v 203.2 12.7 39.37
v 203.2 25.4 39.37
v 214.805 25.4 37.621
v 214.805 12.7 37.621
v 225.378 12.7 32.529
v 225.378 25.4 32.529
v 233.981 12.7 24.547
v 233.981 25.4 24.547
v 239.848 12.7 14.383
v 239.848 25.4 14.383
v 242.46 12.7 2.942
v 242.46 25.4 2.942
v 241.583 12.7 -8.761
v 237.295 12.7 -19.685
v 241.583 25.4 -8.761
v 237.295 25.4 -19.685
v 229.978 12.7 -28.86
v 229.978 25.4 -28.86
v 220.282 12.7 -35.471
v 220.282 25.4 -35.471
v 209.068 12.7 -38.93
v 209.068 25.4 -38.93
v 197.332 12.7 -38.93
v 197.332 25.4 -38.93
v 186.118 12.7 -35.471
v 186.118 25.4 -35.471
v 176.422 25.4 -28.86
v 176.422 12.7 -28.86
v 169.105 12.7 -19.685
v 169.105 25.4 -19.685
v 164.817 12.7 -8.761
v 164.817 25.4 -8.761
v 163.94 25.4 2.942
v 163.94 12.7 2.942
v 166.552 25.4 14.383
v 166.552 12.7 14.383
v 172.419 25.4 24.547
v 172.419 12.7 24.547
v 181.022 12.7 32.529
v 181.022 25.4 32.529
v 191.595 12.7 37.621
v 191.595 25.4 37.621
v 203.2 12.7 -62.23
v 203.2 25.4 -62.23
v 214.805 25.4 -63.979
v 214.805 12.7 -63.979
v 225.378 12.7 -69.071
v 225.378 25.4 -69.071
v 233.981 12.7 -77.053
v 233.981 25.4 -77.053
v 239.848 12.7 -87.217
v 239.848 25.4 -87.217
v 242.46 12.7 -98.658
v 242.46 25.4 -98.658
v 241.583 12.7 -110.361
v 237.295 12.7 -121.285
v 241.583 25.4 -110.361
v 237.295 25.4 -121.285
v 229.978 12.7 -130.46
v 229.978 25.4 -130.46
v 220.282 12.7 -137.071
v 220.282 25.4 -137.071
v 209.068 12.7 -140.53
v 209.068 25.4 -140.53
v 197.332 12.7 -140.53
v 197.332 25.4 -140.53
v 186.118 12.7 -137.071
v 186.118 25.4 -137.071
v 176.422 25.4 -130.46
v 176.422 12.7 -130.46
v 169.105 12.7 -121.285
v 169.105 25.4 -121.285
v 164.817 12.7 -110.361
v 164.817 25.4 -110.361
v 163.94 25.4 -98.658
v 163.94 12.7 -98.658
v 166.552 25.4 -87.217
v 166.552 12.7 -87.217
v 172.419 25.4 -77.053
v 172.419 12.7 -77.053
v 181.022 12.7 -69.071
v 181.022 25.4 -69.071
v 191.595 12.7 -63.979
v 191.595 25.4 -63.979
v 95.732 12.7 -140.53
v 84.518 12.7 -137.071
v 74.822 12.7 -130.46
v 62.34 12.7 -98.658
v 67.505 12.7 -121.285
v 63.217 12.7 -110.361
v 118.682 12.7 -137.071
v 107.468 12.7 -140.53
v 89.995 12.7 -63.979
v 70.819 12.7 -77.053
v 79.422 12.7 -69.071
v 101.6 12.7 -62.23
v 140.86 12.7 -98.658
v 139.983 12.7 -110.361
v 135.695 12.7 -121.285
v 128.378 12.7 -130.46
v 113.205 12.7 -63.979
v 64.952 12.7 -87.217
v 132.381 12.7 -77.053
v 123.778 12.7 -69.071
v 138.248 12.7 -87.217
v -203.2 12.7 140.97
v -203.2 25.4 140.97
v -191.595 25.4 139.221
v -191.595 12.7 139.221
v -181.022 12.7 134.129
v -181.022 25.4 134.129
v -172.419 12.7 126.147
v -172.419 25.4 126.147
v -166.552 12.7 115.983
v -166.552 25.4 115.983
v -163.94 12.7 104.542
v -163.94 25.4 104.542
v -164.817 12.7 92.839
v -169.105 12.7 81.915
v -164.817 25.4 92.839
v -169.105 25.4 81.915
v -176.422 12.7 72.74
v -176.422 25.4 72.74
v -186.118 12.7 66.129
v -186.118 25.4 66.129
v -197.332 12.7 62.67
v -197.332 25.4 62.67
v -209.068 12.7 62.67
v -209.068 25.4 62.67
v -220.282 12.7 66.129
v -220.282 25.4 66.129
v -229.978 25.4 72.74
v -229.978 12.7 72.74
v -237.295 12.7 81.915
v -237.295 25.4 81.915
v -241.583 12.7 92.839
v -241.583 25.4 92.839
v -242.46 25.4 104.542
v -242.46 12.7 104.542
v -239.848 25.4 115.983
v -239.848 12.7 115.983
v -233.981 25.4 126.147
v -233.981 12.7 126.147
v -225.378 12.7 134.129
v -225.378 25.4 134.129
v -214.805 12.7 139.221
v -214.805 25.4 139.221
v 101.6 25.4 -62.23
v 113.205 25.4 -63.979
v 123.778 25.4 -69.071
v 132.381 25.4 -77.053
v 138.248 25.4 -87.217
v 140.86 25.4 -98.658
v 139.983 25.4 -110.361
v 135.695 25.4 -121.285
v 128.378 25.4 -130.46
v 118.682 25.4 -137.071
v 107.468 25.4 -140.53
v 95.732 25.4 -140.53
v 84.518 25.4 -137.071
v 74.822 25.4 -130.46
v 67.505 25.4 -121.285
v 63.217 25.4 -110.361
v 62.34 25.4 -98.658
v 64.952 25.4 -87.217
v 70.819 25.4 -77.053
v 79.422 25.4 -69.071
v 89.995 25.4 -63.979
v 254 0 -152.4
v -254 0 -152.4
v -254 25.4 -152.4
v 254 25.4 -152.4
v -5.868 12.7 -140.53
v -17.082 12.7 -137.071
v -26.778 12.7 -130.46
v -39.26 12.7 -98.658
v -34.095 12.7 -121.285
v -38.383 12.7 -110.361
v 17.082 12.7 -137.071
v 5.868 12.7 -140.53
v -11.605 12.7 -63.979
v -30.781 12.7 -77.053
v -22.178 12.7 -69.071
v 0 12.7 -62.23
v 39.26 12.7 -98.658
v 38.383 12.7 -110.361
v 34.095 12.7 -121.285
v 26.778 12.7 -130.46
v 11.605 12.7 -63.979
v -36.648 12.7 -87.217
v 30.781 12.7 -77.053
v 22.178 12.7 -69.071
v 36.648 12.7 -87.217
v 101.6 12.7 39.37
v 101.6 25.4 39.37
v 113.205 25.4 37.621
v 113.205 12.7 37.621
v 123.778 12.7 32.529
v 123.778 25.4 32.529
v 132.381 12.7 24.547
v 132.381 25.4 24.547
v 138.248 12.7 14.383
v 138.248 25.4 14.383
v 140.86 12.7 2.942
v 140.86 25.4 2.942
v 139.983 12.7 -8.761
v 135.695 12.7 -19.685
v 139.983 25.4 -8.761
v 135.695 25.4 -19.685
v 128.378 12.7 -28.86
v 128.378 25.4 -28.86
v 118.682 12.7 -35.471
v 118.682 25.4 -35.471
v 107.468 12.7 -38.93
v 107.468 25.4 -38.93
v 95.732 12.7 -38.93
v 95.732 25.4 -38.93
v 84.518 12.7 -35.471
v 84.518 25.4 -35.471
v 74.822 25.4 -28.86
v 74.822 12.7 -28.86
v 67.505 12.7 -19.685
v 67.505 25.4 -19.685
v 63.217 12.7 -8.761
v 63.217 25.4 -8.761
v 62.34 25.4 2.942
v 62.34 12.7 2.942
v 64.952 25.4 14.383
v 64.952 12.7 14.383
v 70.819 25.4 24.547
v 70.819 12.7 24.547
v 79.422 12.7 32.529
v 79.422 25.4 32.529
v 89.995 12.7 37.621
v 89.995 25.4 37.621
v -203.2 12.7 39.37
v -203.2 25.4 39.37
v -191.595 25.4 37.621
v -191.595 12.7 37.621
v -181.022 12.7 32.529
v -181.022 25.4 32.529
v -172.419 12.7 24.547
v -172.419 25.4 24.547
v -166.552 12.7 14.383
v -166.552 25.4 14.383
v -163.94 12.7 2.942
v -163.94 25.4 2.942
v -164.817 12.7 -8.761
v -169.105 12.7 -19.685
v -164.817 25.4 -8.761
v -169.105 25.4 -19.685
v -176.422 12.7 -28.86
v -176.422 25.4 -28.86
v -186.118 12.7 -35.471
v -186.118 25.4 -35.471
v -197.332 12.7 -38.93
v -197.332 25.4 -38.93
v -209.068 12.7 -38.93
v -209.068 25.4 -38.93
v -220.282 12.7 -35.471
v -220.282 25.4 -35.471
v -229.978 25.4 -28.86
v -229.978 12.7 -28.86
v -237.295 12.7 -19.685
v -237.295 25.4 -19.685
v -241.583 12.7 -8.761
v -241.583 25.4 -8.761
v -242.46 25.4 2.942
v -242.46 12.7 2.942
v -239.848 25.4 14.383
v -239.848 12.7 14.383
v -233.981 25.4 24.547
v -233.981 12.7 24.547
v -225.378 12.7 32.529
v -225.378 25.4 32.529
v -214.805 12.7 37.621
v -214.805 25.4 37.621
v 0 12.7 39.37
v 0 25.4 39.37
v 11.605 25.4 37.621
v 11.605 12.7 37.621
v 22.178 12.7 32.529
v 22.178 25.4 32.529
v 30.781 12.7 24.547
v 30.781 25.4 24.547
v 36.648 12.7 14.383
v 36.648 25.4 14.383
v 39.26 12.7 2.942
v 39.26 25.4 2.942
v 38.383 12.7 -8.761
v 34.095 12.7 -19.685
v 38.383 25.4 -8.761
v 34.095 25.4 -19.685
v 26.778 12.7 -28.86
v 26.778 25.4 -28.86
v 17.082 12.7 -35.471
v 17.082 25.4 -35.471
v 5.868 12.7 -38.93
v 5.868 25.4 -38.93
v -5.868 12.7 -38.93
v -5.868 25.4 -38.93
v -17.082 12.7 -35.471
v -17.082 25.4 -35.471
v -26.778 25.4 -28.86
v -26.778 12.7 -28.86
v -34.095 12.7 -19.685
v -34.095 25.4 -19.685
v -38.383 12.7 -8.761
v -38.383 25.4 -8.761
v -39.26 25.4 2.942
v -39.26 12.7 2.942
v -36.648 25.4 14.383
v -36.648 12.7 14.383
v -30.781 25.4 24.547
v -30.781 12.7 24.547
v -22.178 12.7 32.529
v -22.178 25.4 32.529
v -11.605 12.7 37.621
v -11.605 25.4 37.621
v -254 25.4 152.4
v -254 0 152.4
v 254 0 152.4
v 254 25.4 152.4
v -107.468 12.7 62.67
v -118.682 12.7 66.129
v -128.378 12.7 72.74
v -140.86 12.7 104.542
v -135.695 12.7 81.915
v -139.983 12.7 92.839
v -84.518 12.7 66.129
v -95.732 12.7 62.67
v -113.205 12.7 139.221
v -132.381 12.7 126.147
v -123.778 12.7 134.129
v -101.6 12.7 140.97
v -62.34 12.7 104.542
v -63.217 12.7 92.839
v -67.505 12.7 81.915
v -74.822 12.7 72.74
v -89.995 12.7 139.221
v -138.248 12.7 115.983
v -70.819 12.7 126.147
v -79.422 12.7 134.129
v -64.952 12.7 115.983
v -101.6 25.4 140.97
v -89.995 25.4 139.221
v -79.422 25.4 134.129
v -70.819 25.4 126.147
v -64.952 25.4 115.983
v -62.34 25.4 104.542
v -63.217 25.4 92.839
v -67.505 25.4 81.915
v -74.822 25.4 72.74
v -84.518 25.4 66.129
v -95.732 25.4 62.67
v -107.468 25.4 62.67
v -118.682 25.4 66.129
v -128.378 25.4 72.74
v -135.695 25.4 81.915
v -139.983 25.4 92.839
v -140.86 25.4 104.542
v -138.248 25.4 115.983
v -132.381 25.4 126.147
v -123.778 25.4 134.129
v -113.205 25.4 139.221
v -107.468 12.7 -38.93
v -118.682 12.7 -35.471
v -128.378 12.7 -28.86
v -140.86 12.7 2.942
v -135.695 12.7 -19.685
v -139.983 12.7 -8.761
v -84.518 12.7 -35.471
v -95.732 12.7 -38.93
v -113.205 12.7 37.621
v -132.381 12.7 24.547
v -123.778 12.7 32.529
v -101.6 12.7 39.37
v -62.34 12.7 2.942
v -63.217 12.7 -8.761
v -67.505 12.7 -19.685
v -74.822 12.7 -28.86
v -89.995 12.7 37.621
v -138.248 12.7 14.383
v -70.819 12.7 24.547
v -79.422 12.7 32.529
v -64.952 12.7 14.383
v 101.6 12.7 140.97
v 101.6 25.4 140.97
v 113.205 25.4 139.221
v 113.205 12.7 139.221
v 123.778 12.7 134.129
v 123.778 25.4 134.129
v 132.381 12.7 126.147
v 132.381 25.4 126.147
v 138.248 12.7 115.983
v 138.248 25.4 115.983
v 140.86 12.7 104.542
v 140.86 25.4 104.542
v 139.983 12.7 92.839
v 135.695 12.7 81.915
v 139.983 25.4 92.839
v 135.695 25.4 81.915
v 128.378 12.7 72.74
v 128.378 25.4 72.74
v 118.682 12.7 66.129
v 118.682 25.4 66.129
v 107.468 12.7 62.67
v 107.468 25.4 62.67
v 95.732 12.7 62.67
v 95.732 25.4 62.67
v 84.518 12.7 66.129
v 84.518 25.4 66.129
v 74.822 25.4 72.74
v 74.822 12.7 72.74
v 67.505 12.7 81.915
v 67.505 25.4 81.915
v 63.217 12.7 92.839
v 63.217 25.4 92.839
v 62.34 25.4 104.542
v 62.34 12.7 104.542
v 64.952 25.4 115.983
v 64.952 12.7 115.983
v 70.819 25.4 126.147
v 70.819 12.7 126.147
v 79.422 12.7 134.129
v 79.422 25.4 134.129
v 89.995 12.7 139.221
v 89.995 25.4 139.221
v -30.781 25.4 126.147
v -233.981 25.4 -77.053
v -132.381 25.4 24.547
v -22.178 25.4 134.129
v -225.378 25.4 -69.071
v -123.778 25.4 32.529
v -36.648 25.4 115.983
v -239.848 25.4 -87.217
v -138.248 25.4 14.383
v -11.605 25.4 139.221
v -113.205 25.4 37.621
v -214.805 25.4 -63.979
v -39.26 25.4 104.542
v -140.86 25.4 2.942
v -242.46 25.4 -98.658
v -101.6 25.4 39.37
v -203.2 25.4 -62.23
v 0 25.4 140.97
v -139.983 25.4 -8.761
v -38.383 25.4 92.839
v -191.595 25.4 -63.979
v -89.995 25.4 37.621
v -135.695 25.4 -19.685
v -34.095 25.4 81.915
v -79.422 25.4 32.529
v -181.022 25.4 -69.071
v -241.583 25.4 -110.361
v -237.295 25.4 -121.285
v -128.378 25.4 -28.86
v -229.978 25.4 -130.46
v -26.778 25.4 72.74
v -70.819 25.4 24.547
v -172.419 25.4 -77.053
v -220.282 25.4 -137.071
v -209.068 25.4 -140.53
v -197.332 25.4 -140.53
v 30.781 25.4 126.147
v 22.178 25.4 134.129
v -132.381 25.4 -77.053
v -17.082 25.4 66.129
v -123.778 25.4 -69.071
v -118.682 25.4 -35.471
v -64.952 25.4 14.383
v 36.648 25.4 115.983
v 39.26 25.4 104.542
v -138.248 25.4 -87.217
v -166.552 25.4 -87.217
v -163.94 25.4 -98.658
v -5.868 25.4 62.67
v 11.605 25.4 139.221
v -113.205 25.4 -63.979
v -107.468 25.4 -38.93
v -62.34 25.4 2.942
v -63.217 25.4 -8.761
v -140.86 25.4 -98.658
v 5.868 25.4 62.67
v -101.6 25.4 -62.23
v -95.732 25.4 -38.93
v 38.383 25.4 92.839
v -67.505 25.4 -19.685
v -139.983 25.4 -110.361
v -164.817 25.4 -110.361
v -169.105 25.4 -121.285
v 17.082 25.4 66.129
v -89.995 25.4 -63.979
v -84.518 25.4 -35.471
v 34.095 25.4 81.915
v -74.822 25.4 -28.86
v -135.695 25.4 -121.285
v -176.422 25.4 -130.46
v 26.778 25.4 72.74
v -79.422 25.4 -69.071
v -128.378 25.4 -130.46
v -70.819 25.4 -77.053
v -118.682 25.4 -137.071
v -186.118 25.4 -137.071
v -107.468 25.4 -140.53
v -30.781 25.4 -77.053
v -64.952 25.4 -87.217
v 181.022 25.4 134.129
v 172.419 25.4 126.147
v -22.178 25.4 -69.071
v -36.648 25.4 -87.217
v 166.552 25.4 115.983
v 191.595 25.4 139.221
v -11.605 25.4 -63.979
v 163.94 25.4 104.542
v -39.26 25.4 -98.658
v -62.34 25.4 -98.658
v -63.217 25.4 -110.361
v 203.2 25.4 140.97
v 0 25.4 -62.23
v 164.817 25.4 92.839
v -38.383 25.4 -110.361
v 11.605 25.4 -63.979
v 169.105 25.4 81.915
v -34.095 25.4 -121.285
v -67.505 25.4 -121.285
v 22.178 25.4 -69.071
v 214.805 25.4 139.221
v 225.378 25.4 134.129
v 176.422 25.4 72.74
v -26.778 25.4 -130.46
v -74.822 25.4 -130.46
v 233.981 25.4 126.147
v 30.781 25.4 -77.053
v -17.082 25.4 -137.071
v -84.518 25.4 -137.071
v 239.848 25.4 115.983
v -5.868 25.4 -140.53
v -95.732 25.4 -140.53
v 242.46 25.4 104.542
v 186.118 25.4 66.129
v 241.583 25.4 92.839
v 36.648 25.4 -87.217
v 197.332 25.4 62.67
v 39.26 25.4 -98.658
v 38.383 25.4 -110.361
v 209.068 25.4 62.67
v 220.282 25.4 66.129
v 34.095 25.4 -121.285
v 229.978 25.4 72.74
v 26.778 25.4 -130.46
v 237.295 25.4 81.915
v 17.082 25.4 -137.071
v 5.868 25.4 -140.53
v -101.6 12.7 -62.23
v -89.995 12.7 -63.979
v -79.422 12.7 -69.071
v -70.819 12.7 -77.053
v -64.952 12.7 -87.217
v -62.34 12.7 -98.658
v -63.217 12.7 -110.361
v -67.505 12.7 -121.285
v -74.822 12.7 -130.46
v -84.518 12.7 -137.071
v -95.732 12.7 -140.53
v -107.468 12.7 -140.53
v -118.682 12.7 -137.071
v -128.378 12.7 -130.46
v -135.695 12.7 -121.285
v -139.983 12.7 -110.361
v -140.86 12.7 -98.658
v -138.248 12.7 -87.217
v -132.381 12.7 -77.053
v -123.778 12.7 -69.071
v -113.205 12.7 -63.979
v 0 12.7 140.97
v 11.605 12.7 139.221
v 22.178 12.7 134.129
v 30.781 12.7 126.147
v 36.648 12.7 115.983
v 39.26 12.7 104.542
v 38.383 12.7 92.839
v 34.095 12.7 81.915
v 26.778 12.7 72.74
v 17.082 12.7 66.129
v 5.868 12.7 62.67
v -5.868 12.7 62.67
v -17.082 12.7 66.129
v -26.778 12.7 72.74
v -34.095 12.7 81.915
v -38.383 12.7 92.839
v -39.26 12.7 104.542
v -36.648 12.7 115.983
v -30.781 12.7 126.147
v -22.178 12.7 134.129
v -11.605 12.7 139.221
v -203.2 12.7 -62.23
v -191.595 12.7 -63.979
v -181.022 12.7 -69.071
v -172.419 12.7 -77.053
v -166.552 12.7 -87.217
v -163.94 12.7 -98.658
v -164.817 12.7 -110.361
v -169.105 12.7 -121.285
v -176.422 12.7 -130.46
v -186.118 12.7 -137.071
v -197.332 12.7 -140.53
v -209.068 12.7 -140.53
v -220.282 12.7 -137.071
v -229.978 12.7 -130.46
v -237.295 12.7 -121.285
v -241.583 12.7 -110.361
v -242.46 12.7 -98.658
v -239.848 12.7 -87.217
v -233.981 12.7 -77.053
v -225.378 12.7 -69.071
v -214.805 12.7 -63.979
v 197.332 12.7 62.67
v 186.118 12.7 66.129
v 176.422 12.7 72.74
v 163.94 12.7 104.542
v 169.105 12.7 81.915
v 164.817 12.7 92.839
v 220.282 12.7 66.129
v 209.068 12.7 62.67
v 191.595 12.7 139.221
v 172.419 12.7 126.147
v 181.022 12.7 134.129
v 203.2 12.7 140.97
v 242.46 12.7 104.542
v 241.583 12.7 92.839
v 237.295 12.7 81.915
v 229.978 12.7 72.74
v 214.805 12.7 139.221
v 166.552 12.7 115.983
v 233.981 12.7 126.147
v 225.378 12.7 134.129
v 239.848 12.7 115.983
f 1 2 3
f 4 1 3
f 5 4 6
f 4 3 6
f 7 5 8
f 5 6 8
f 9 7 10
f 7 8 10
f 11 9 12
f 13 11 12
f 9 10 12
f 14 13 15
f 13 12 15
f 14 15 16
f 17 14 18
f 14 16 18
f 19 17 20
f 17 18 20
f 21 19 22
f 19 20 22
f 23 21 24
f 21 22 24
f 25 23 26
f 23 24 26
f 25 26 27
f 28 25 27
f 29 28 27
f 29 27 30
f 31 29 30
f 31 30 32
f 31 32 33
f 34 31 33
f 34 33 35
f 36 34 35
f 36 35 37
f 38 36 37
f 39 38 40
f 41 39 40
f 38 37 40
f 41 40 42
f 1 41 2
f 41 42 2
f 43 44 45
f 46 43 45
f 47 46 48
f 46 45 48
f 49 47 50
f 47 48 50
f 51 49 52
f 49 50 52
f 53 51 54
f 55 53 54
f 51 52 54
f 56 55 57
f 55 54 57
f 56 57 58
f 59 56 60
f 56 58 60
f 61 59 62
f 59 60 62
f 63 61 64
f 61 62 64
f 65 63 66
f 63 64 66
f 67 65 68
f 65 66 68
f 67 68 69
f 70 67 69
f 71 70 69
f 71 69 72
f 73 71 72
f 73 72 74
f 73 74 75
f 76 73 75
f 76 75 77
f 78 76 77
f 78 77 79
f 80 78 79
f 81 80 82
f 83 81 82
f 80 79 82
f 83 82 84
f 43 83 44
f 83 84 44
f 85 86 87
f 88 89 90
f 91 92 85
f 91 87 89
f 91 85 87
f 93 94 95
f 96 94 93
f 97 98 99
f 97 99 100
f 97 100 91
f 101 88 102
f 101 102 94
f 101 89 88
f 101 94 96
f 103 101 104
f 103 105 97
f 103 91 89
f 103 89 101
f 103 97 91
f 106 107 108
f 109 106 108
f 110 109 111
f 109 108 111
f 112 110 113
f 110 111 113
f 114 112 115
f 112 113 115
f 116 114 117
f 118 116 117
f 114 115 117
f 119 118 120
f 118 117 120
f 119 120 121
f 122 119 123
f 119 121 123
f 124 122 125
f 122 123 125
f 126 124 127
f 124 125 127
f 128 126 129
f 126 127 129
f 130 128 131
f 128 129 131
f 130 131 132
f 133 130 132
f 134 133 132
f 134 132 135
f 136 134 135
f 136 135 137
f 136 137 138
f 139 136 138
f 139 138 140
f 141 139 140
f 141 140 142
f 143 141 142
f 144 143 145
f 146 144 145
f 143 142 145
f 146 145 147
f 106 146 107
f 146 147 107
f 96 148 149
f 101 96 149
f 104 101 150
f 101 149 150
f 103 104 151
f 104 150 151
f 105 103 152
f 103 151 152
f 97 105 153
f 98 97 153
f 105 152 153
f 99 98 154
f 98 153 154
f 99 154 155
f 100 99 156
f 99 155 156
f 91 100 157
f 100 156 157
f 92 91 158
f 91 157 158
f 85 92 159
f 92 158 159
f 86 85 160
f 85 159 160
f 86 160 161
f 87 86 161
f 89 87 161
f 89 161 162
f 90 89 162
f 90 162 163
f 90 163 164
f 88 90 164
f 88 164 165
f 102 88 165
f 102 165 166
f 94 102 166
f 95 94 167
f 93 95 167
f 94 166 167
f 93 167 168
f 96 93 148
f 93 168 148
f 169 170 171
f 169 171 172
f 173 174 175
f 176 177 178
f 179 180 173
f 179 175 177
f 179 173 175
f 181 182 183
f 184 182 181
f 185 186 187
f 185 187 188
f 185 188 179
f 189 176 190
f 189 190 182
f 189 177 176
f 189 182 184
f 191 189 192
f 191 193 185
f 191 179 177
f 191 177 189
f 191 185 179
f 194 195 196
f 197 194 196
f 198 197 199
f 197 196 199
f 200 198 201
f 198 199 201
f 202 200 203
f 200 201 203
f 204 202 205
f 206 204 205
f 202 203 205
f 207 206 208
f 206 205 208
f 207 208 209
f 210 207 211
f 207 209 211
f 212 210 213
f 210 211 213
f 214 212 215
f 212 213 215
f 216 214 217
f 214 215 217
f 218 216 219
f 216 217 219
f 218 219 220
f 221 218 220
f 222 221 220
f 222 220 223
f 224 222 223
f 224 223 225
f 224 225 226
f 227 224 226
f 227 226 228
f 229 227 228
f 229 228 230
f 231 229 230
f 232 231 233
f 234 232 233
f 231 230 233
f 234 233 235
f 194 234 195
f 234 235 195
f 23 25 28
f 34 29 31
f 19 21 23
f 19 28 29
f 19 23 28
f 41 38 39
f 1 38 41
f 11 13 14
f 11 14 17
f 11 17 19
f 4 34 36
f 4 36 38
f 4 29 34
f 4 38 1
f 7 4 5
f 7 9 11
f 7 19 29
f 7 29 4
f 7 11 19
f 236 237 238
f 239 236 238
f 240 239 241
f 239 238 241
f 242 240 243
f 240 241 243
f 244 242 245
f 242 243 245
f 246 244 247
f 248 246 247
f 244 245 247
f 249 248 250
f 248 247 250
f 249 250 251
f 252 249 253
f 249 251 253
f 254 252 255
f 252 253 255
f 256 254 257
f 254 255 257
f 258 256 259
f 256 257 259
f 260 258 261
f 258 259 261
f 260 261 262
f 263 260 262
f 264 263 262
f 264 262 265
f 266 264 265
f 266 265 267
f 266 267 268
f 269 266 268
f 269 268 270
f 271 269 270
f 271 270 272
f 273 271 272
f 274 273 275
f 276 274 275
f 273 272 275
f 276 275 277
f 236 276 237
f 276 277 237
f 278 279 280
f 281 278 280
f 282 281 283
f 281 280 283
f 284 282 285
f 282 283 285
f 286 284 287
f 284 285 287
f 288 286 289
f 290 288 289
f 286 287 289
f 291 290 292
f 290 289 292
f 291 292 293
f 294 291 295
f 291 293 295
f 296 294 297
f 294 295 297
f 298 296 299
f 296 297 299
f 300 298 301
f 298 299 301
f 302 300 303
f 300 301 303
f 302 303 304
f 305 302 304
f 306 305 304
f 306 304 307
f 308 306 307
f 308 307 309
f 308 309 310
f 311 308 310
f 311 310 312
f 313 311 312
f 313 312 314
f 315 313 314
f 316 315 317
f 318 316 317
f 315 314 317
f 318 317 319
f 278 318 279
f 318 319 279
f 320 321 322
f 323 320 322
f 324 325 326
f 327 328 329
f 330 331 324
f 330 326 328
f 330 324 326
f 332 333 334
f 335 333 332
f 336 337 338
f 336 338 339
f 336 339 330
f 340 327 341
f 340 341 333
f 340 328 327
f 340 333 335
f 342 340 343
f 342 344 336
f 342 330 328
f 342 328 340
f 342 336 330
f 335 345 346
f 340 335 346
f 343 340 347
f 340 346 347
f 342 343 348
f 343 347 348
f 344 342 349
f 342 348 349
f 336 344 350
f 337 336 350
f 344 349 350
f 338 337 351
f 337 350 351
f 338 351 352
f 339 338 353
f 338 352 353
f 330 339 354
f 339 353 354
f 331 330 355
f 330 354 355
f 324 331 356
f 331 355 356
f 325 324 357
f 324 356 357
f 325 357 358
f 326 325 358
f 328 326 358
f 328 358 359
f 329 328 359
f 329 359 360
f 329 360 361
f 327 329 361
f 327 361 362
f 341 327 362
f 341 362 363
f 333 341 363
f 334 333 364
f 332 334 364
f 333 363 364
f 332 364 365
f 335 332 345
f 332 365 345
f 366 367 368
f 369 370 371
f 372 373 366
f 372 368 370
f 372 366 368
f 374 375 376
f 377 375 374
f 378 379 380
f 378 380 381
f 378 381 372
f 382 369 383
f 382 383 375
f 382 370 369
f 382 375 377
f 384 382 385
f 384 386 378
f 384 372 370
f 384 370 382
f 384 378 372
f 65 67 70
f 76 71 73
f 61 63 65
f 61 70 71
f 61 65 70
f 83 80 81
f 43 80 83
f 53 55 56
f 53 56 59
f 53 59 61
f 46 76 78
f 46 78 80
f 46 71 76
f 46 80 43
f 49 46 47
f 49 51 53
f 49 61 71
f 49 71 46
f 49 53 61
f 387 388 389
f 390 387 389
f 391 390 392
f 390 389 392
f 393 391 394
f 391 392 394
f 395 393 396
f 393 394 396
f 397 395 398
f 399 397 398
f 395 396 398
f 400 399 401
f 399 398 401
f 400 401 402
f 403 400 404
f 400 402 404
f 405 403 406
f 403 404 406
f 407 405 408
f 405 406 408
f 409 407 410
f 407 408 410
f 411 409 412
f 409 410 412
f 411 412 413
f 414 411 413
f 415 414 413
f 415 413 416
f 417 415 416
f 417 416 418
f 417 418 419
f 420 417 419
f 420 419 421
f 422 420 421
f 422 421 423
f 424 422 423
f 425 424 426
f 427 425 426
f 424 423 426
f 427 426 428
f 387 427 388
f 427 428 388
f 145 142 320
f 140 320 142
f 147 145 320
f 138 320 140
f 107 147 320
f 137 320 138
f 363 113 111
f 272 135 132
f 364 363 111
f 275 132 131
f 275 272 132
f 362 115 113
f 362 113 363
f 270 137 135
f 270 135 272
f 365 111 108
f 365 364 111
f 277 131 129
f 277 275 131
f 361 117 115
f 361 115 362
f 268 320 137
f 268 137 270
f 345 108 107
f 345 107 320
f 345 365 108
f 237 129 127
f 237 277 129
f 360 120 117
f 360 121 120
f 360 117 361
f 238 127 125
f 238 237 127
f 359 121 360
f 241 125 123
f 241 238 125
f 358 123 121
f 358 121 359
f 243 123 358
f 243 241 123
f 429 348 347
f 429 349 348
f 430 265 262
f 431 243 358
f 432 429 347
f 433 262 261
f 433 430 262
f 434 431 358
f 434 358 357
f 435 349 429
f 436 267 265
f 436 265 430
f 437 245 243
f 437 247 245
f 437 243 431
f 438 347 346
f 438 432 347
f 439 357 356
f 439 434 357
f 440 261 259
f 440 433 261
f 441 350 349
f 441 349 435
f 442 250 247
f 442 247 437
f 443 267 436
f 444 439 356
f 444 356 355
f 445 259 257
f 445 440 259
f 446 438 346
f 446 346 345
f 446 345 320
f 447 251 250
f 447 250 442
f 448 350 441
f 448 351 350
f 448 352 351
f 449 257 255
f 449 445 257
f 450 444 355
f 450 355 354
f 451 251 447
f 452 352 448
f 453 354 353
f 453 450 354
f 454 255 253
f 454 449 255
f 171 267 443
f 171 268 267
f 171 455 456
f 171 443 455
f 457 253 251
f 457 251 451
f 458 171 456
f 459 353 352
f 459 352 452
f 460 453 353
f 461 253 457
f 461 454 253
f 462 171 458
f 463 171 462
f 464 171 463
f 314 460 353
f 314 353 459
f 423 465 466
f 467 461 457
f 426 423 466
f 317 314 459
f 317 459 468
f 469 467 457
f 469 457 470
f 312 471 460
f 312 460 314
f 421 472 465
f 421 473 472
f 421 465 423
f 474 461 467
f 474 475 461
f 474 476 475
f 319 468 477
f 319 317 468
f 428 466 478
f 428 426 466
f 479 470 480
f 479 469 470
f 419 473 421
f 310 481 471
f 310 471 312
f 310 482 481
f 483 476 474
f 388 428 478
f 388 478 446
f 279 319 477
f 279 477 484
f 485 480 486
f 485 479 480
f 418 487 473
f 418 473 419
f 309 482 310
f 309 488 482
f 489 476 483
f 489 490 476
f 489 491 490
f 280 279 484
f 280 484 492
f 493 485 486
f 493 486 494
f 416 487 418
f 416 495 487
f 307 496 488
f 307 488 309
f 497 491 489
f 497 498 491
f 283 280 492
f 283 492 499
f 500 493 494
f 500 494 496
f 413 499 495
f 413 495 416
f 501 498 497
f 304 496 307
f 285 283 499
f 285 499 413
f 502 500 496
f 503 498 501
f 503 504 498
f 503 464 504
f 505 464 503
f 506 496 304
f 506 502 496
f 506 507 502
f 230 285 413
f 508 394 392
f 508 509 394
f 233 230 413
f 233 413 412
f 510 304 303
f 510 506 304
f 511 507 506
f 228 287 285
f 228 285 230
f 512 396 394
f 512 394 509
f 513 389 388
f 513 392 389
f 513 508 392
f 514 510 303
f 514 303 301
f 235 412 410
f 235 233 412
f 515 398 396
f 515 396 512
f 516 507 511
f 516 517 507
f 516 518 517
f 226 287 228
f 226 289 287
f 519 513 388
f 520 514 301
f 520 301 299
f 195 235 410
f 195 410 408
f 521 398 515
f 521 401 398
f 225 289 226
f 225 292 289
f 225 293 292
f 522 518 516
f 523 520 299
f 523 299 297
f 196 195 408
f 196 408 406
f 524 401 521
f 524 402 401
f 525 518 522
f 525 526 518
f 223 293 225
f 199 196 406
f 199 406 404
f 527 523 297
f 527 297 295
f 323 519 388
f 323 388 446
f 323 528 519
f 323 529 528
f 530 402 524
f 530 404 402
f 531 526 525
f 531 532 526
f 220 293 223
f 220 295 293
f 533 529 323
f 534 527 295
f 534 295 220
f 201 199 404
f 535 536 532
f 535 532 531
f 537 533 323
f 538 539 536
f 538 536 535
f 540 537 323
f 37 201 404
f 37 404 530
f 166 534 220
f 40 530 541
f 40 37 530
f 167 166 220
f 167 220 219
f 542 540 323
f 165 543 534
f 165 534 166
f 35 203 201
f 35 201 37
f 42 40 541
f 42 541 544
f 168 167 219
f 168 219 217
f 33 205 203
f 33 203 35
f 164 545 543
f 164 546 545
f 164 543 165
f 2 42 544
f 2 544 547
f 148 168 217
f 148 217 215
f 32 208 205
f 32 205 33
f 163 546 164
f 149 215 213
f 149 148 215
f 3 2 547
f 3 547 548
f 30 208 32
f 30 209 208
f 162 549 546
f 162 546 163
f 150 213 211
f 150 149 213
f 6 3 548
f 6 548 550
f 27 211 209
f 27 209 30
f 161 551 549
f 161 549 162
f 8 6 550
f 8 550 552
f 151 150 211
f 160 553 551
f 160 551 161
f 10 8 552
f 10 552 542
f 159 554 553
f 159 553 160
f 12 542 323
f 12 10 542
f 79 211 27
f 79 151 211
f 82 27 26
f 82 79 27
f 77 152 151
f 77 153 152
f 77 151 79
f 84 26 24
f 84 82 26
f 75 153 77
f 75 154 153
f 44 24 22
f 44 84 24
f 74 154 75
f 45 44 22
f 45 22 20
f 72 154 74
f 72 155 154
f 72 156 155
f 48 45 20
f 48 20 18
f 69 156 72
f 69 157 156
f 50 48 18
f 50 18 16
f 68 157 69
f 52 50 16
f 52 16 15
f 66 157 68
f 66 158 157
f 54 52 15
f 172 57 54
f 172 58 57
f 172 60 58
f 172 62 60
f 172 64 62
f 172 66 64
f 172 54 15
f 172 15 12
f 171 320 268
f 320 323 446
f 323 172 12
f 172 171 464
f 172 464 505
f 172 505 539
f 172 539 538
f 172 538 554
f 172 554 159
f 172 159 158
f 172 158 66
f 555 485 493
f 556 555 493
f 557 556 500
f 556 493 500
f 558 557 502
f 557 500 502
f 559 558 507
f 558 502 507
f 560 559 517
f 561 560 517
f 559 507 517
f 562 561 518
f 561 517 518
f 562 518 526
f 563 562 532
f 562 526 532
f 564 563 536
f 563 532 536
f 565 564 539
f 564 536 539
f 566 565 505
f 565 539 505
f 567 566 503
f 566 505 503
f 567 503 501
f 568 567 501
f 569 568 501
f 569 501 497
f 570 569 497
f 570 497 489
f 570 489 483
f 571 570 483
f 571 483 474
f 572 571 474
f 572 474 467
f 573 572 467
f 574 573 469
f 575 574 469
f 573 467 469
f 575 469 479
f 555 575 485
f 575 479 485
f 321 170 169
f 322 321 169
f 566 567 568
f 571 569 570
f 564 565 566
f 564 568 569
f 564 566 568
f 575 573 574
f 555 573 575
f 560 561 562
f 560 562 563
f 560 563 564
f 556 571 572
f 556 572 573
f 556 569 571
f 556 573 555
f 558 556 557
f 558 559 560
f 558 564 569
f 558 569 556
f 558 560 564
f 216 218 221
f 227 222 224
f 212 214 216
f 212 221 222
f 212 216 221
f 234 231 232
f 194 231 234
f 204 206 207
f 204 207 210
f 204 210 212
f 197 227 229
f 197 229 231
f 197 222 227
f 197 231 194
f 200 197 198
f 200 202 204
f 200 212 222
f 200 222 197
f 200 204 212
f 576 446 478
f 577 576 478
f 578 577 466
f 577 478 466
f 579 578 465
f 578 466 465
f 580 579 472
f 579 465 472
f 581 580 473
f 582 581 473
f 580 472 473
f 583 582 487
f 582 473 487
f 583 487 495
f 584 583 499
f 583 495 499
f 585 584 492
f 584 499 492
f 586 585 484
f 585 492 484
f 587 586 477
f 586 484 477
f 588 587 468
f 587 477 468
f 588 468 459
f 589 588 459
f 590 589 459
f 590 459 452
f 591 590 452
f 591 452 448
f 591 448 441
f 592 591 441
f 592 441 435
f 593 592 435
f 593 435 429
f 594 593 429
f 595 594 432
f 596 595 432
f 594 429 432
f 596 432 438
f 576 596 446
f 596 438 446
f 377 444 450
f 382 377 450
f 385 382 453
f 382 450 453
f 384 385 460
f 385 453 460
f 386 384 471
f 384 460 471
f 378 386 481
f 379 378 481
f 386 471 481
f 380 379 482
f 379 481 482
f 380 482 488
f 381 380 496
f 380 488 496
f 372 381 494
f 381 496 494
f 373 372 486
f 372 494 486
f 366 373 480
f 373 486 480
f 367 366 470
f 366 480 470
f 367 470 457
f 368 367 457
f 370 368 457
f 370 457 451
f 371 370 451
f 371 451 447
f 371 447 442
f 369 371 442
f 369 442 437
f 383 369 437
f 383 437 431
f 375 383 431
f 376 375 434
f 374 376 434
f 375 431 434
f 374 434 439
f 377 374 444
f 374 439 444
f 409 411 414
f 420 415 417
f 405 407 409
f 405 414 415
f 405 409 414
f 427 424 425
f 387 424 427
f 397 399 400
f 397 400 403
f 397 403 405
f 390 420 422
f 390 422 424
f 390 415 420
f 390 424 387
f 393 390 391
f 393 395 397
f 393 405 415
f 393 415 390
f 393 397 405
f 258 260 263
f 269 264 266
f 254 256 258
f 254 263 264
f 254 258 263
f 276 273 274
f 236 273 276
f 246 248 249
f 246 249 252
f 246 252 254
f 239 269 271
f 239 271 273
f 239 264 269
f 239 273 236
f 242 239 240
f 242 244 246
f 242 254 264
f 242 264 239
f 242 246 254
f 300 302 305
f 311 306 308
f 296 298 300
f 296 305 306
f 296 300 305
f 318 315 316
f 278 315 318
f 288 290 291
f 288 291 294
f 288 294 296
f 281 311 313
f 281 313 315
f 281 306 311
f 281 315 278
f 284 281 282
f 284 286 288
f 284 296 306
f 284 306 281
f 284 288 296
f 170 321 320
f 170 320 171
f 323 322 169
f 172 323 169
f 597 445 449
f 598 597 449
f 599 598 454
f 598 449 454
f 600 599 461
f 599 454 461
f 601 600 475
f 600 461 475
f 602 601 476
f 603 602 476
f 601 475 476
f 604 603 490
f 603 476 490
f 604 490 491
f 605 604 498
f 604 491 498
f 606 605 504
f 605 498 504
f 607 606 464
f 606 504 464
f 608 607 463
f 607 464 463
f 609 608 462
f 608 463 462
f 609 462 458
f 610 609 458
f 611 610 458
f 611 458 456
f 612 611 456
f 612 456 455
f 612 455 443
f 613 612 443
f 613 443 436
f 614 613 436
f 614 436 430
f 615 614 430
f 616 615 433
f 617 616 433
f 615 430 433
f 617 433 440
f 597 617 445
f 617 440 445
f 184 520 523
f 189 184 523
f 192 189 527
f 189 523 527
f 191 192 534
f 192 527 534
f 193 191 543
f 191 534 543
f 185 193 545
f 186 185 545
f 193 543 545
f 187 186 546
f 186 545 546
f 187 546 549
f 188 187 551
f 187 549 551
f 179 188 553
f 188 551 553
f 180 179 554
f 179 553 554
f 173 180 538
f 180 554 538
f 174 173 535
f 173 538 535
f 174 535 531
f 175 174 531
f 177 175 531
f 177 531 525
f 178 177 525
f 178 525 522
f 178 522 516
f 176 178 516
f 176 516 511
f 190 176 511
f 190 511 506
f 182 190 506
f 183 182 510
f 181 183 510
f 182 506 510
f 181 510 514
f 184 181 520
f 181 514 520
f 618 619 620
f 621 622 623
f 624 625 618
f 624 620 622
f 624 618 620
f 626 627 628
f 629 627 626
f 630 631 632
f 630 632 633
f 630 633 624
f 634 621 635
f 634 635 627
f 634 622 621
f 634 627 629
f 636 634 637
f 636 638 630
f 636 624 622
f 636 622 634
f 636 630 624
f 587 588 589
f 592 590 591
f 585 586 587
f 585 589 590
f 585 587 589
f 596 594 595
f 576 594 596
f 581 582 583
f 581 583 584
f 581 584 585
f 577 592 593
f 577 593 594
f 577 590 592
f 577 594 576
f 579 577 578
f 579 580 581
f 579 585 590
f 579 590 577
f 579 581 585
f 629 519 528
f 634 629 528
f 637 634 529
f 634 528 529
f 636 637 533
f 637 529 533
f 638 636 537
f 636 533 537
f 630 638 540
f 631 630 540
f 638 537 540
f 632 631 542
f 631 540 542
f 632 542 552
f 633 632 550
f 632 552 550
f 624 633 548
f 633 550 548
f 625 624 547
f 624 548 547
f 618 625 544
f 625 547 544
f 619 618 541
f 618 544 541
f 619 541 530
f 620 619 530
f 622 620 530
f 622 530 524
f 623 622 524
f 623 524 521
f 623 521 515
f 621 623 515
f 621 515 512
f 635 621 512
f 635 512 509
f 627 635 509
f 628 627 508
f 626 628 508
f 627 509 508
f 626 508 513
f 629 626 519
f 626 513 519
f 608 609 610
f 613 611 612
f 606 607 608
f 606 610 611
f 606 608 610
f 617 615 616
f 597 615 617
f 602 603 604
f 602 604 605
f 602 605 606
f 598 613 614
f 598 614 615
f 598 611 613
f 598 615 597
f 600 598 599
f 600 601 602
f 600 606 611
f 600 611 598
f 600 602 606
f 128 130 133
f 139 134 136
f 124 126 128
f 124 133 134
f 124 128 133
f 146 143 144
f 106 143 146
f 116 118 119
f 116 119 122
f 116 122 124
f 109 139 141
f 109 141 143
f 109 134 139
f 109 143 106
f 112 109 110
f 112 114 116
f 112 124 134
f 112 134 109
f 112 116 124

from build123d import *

# Parameters (mm, degrees)
SKETCH1_W            = 508
SKETCH1_H            = 304.8
BOSS_EXTRUDE1_DEPTH  = 25.4
SKETCH2_R            = 39.37
CUT_EXTRUDE1_DEPTH   = 12.7
LPATTERN1_COUNT      = 5
LPATTERN1_PITCH      = 101.6
LPATTERN1_COUNT_DIR2 = 3
LPATTERN1_PITCH_DIR2 = 101.6


with BuildPart() as part:
    # Sketch1 → Boss-Extrude1 (new body)
    with BuildSketch(Plane(origin=(0, 0, 0), x_dir=(1, 0, 0), z_dir=(0, 1, 0))):
        Rectangle(SKETCH1_W, SKETCH1_H)
    extrude(amount=BOSS_EXTRUDE1_DEPTH)

    # Sketch2 → Cut-Extrude1 (cut)
    with BuildSketch(Plane(origin=(0, 25.4, 0), x_dir=(1, 0, 0), z_dir=(0, 1, 0))):
        with Locations(Location((-203.2, -101.6, 0), (0, 0, 270))):
            Circle(SKETCH2_R)
    cut_extrude1 = extrude(amount=-CUT_EXTRUDE1_DEPTH, mode=Mode.SUBTRACT)

    # LPattern1: Cut-Extrude1 5 × 3
    with Locations(*[(i * LPATTERN1_PITCH, 0, -j * LPATTERN1_PITCH_DIR2) for i in range(LPATTERN1_COUNT) for j in range(LPATTERN1_COUNT_DIR2) if (i, j) != (0, 0)]):
        add(cut_extrude1, mode=Mode.SUBTRACT)


solid = part.part
